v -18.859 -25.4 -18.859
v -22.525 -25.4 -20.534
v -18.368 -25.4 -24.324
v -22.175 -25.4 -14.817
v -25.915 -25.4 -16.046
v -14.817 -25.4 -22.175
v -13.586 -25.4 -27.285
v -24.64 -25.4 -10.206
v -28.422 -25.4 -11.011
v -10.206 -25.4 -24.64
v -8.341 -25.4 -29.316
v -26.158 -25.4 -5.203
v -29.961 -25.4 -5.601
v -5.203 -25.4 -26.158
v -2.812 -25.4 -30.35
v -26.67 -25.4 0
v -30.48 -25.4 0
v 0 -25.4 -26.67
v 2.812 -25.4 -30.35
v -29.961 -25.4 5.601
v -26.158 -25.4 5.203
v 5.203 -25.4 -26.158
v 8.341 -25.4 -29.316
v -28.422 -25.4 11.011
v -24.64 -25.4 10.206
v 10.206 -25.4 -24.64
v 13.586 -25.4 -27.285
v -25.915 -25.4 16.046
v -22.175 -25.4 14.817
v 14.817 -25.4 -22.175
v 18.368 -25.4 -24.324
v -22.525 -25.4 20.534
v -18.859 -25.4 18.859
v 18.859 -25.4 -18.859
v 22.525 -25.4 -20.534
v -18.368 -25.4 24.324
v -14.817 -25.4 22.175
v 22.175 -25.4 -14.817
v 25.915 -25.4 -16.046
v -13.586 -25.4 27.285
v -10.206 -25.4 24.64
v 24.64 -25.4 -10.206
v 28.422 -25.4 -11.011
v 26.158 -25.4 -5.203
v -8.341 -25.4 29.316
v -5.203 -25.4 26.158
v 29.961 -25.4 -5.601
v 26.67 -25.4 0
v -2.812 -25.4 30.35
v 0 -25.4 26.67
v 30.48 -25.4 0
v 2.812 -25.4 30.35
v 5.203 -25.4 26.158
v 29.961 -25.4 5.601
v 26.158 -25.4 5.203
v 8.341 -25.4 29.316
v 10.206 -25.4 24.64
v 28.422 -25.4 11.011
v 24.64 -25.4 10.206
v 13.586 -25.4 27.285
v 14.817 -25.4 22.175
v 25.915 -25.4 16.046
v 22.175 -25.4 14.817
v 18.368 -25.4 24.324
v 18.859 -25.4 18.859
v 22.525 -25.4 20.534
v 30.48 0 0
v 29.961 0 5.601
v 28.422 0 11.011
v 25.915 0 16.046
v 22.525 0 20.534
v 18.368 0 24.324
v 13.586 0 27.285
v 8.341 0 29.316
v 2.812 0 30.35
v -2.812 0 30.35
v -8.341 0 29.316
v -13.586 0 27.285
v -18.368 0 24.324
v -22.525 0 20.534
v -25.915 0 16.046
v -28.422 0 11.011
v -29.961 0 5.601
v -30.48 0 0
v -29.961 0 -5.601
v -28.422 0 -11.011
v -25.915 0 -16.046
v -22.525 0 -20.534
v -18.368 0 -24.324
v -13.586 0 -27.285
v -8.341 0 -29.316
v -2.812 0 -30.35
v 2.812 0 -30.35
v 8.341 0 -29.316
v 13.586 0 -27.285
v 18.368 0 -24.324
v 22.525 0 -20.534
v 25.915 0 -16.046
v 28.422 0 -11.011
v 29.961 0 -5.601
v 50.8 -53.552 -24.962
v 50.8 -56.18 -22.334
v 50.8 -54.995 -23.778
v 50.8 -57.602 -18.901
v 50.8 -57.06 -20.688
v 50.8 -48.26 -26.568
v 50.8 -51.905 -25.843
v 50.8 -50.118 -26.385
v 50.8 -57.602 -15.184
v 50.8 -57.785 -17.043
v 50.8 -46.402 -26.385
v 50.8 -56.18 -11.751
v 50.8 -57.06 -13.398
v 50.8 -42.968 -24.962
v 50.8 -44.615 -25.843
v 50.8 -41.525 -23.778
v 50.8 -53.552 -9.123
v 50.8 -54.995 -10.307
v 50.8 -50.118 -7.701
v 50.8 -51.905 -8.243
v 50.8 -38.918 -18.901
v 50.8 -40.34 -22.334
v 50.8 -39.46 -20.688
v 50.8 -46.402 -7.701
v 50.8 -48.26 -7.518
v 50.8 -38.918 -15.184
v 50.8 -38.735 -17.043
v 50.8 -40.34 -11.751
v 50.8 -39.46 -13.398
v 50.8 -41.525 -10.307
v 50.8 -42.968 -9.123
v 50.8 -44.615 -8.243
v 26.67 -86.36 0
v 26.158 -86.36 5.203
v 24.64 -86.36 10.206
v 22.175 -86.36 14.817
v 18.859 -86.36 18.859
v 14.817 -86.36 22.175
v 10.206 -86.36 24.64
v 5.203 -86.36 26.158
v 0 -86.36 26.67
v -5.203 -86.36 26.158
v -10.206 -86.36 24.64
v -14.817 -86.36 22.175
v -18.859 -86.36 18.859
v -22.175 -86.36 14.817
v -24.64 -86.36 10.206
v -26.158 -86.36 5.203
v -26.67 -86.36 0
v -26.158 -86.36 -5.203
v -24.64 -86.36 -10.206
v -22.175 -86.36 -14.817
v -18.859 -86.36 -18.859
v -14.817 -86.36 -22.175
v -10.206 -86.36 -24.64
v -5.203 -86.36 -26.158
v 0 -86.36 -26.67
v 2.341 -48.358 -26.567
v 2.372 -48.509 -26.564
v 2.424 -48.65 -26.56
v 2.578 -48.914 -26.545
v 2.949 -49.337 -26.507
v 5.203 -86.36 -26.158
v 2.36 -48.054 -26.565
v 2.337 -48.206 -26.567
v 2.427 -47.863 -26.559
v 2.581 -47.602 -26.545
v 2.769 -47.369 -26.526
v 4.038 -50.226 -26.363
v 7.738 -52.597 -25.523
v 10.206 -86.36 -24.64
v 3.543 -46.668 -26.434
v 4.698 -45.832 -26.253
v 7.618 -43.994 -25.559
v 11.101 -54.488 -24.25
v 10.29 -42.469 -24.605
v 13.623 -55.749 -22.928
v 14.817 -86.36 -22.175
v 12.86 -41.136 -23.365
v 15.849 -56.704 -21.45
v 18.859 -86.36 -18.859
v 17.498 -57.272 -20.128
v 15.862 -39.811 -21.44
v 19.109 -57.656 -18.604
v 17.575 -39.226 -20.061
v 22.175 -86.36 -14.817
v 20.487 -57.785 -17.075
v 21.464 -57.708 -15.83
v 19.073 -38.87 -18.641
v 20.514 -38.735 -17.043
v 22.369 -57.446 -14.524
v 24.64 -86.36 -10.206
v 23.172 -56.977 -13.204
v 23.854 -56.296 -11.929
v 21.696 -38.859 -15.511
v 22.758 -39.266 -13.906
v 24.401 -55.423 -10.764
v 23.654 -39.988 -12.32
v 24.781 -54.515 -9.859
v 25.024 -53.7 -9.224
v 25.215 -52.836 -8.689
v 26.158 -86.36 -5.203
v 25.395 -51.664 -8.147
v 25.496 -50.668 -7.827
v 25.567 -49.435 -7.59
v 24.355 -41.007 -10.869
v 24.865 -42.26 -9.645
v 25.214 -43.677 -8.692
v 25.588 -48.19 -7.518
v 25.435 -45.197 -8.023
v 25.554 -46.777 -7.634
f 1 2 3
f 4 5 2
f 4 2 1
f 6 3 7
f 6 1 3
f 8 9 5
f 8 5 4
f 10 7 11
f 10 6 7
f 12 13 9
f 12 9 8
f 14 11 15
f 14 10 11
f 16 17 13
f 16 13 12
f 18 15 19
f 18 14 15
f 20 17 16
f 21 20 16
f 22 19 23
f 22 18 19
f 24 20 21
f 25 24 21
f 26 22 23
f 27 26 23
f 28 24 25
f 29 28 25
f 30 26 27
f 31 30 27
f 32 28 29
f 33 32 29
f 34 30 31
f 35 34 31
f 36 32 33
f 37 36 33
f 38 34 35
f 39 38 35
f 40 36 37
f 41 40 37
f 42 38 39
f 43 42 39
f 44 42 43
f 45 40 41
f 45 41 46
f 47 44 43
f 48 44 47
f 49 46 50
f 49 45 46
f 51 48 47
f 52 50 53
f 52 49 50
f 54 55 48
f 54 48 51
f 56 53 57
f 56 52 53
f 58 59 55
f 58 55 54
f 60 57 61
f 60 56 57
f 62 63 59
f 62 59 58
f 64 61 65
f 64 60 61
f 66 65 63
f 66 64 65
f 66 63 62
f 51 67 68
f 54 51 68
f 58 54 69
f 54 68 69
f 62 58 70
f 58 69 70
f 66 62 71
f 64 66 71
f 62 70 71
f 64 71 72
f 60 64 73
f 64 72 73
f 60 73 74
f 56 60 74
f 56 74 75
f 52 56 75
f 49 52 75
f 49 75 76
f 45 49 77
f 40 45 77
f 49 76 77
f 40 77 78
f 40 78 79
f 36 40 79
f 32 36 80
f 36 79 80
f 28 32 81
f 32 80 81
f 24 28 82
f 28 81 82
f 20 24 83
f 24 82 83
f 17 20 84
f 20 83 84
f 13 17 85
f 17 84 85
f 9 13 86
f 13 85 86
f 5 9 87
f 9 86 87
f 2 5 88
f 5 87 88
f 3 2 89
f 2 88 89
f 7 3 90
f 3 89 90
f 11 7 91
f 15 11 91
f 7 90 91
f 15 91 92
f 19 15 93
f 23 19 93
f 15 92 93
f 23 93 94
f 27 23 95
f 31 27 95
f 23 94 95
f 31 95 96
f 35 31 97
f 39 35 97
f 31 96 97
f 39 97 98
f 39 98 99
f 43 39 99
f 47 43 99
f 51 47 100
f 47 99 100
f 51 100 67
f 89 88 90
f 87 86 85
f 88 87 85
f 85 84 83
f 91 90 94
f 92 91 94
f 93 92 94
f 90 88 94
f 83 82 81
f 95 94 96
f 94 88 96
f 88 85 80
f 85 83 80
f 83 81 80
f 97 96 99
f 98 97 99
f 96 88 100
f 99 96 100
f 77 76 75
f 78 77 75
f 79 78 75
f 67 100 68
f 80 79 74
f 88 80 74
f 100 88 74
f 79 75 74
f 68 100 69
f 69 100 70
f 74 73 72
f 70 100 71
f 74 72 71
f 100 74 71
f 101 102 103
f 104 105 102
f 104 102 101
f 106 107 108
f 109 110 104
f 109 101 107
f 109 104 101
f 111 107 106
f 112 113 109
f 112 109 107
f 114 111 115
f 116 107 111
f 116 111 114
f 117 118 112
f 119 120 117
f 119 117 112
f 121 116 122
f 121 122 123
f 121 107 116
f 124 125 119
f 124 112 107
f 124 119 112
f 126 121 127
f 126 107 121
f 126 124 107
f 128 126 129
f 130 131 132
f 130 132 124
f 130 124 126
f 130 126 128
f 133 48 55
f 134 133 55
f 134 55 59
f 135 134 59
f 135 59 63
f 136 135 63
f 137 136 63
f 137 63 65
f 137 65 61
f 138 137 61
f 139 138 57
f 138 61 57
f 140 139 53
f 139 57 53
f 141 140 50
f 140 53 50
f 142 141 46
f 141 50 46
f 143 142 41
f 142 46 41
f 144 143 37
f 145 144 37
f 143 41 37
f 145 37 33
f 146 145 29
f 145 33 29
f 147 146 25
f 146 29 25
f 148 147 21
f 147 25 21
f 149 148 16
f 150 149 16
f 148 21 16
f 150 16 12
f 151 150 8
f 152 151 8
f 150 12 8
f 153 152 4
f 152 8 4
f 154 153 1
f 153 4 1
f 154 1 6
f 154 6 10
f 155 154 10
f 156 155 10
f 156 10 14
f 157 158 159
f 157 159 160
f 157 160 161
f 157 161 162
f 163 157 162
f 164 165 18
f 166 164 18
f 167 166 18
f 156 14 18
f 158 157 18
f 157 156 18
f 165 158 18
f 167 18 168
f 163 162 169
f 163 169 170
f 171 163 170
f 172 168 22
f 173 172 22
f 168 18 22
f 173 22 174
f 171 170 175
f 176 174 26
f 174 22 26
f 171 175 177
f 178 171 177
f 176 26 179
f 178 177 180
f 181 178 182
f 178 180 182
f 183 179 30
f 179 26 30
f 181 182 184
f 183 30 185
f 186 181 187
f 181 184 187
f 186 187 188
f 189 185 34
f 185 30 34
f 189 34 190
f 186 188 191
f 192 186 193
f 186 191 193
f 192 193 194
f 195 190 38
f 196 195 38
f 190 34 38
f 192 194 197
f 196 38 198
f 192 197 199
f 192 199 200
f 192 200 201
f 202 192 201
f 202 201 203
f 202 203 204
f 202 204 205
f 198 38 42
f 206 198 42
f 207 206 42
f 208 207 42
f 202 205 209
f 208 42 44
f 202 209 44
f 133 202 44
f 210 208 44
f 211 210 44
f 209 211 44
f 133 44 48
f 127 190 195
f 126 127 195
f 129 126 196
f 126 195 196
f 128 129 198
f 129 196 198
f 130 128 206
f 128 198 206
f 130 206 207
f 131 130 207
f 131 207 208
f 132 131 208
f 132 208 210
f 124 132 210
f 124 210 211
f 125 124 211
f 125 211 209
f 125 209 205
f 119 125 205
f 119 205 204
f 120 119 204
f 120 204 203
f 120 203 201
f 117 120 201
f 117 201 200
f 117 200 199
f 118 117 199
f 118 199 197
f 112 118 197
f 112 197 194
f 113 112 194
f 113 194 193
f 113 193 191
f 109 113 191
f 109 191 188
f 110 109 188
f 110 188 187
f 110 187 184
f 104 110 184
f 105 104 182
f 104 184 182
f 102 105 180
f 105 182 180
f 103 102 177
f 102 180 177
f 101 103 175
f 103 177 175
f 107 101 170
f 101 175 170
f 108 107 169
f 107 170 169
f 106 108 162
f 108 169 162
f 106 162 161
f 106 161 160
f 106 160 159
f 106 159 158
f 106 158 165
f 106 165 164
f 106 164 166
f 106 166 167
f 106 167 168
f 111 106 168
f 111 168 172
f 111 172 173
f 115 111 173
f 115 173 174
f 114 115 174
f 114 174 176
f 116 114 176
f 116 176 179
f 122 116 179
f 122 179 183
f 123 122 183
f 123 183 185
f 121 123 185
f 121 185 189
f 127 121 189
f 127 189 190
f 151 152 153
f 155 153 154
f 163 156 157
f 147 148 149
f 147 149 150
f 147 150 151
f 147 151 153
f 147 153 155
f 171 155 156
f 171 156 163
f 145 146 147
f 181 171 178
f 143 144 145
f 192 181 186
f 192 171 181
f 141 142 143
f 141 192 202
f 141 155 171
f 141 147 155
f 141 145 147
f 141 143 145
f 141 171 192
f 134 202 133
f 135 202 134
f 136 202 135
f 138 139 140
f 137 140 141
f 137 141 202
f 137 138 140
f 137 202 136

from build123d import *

# Parameters (mm, degrees)
F0_R     = 30.48
F1_DEPTH = 25.4
F2_R     = 26.67
F3_DEPTH = 60.96
F4_R     = 9.525
F5_DEPTH = 50.8


with BuildPart() as f1:
    # F0 (on Front) → F1 (new body)
    with BuildSketch(Plane.XZ):
        Circle(F0_R)
    extrude(amount=F1_DEPTH)

    # F2 (on face) → F3 (join)
    with BuildSketch(Plane.XZ.offset(25.4)):
        Circle(F2_R)
    extrude(amount=F3_DEPTH)

    # F4 (on Right) → F5 (join)
    with BuildSketch(Plane.YZ):
        with Locations((-48.26, -17.042583)):
            Circle(F4_R)
    extrude(amount=F5_DEPTH)


solid = f1.part
